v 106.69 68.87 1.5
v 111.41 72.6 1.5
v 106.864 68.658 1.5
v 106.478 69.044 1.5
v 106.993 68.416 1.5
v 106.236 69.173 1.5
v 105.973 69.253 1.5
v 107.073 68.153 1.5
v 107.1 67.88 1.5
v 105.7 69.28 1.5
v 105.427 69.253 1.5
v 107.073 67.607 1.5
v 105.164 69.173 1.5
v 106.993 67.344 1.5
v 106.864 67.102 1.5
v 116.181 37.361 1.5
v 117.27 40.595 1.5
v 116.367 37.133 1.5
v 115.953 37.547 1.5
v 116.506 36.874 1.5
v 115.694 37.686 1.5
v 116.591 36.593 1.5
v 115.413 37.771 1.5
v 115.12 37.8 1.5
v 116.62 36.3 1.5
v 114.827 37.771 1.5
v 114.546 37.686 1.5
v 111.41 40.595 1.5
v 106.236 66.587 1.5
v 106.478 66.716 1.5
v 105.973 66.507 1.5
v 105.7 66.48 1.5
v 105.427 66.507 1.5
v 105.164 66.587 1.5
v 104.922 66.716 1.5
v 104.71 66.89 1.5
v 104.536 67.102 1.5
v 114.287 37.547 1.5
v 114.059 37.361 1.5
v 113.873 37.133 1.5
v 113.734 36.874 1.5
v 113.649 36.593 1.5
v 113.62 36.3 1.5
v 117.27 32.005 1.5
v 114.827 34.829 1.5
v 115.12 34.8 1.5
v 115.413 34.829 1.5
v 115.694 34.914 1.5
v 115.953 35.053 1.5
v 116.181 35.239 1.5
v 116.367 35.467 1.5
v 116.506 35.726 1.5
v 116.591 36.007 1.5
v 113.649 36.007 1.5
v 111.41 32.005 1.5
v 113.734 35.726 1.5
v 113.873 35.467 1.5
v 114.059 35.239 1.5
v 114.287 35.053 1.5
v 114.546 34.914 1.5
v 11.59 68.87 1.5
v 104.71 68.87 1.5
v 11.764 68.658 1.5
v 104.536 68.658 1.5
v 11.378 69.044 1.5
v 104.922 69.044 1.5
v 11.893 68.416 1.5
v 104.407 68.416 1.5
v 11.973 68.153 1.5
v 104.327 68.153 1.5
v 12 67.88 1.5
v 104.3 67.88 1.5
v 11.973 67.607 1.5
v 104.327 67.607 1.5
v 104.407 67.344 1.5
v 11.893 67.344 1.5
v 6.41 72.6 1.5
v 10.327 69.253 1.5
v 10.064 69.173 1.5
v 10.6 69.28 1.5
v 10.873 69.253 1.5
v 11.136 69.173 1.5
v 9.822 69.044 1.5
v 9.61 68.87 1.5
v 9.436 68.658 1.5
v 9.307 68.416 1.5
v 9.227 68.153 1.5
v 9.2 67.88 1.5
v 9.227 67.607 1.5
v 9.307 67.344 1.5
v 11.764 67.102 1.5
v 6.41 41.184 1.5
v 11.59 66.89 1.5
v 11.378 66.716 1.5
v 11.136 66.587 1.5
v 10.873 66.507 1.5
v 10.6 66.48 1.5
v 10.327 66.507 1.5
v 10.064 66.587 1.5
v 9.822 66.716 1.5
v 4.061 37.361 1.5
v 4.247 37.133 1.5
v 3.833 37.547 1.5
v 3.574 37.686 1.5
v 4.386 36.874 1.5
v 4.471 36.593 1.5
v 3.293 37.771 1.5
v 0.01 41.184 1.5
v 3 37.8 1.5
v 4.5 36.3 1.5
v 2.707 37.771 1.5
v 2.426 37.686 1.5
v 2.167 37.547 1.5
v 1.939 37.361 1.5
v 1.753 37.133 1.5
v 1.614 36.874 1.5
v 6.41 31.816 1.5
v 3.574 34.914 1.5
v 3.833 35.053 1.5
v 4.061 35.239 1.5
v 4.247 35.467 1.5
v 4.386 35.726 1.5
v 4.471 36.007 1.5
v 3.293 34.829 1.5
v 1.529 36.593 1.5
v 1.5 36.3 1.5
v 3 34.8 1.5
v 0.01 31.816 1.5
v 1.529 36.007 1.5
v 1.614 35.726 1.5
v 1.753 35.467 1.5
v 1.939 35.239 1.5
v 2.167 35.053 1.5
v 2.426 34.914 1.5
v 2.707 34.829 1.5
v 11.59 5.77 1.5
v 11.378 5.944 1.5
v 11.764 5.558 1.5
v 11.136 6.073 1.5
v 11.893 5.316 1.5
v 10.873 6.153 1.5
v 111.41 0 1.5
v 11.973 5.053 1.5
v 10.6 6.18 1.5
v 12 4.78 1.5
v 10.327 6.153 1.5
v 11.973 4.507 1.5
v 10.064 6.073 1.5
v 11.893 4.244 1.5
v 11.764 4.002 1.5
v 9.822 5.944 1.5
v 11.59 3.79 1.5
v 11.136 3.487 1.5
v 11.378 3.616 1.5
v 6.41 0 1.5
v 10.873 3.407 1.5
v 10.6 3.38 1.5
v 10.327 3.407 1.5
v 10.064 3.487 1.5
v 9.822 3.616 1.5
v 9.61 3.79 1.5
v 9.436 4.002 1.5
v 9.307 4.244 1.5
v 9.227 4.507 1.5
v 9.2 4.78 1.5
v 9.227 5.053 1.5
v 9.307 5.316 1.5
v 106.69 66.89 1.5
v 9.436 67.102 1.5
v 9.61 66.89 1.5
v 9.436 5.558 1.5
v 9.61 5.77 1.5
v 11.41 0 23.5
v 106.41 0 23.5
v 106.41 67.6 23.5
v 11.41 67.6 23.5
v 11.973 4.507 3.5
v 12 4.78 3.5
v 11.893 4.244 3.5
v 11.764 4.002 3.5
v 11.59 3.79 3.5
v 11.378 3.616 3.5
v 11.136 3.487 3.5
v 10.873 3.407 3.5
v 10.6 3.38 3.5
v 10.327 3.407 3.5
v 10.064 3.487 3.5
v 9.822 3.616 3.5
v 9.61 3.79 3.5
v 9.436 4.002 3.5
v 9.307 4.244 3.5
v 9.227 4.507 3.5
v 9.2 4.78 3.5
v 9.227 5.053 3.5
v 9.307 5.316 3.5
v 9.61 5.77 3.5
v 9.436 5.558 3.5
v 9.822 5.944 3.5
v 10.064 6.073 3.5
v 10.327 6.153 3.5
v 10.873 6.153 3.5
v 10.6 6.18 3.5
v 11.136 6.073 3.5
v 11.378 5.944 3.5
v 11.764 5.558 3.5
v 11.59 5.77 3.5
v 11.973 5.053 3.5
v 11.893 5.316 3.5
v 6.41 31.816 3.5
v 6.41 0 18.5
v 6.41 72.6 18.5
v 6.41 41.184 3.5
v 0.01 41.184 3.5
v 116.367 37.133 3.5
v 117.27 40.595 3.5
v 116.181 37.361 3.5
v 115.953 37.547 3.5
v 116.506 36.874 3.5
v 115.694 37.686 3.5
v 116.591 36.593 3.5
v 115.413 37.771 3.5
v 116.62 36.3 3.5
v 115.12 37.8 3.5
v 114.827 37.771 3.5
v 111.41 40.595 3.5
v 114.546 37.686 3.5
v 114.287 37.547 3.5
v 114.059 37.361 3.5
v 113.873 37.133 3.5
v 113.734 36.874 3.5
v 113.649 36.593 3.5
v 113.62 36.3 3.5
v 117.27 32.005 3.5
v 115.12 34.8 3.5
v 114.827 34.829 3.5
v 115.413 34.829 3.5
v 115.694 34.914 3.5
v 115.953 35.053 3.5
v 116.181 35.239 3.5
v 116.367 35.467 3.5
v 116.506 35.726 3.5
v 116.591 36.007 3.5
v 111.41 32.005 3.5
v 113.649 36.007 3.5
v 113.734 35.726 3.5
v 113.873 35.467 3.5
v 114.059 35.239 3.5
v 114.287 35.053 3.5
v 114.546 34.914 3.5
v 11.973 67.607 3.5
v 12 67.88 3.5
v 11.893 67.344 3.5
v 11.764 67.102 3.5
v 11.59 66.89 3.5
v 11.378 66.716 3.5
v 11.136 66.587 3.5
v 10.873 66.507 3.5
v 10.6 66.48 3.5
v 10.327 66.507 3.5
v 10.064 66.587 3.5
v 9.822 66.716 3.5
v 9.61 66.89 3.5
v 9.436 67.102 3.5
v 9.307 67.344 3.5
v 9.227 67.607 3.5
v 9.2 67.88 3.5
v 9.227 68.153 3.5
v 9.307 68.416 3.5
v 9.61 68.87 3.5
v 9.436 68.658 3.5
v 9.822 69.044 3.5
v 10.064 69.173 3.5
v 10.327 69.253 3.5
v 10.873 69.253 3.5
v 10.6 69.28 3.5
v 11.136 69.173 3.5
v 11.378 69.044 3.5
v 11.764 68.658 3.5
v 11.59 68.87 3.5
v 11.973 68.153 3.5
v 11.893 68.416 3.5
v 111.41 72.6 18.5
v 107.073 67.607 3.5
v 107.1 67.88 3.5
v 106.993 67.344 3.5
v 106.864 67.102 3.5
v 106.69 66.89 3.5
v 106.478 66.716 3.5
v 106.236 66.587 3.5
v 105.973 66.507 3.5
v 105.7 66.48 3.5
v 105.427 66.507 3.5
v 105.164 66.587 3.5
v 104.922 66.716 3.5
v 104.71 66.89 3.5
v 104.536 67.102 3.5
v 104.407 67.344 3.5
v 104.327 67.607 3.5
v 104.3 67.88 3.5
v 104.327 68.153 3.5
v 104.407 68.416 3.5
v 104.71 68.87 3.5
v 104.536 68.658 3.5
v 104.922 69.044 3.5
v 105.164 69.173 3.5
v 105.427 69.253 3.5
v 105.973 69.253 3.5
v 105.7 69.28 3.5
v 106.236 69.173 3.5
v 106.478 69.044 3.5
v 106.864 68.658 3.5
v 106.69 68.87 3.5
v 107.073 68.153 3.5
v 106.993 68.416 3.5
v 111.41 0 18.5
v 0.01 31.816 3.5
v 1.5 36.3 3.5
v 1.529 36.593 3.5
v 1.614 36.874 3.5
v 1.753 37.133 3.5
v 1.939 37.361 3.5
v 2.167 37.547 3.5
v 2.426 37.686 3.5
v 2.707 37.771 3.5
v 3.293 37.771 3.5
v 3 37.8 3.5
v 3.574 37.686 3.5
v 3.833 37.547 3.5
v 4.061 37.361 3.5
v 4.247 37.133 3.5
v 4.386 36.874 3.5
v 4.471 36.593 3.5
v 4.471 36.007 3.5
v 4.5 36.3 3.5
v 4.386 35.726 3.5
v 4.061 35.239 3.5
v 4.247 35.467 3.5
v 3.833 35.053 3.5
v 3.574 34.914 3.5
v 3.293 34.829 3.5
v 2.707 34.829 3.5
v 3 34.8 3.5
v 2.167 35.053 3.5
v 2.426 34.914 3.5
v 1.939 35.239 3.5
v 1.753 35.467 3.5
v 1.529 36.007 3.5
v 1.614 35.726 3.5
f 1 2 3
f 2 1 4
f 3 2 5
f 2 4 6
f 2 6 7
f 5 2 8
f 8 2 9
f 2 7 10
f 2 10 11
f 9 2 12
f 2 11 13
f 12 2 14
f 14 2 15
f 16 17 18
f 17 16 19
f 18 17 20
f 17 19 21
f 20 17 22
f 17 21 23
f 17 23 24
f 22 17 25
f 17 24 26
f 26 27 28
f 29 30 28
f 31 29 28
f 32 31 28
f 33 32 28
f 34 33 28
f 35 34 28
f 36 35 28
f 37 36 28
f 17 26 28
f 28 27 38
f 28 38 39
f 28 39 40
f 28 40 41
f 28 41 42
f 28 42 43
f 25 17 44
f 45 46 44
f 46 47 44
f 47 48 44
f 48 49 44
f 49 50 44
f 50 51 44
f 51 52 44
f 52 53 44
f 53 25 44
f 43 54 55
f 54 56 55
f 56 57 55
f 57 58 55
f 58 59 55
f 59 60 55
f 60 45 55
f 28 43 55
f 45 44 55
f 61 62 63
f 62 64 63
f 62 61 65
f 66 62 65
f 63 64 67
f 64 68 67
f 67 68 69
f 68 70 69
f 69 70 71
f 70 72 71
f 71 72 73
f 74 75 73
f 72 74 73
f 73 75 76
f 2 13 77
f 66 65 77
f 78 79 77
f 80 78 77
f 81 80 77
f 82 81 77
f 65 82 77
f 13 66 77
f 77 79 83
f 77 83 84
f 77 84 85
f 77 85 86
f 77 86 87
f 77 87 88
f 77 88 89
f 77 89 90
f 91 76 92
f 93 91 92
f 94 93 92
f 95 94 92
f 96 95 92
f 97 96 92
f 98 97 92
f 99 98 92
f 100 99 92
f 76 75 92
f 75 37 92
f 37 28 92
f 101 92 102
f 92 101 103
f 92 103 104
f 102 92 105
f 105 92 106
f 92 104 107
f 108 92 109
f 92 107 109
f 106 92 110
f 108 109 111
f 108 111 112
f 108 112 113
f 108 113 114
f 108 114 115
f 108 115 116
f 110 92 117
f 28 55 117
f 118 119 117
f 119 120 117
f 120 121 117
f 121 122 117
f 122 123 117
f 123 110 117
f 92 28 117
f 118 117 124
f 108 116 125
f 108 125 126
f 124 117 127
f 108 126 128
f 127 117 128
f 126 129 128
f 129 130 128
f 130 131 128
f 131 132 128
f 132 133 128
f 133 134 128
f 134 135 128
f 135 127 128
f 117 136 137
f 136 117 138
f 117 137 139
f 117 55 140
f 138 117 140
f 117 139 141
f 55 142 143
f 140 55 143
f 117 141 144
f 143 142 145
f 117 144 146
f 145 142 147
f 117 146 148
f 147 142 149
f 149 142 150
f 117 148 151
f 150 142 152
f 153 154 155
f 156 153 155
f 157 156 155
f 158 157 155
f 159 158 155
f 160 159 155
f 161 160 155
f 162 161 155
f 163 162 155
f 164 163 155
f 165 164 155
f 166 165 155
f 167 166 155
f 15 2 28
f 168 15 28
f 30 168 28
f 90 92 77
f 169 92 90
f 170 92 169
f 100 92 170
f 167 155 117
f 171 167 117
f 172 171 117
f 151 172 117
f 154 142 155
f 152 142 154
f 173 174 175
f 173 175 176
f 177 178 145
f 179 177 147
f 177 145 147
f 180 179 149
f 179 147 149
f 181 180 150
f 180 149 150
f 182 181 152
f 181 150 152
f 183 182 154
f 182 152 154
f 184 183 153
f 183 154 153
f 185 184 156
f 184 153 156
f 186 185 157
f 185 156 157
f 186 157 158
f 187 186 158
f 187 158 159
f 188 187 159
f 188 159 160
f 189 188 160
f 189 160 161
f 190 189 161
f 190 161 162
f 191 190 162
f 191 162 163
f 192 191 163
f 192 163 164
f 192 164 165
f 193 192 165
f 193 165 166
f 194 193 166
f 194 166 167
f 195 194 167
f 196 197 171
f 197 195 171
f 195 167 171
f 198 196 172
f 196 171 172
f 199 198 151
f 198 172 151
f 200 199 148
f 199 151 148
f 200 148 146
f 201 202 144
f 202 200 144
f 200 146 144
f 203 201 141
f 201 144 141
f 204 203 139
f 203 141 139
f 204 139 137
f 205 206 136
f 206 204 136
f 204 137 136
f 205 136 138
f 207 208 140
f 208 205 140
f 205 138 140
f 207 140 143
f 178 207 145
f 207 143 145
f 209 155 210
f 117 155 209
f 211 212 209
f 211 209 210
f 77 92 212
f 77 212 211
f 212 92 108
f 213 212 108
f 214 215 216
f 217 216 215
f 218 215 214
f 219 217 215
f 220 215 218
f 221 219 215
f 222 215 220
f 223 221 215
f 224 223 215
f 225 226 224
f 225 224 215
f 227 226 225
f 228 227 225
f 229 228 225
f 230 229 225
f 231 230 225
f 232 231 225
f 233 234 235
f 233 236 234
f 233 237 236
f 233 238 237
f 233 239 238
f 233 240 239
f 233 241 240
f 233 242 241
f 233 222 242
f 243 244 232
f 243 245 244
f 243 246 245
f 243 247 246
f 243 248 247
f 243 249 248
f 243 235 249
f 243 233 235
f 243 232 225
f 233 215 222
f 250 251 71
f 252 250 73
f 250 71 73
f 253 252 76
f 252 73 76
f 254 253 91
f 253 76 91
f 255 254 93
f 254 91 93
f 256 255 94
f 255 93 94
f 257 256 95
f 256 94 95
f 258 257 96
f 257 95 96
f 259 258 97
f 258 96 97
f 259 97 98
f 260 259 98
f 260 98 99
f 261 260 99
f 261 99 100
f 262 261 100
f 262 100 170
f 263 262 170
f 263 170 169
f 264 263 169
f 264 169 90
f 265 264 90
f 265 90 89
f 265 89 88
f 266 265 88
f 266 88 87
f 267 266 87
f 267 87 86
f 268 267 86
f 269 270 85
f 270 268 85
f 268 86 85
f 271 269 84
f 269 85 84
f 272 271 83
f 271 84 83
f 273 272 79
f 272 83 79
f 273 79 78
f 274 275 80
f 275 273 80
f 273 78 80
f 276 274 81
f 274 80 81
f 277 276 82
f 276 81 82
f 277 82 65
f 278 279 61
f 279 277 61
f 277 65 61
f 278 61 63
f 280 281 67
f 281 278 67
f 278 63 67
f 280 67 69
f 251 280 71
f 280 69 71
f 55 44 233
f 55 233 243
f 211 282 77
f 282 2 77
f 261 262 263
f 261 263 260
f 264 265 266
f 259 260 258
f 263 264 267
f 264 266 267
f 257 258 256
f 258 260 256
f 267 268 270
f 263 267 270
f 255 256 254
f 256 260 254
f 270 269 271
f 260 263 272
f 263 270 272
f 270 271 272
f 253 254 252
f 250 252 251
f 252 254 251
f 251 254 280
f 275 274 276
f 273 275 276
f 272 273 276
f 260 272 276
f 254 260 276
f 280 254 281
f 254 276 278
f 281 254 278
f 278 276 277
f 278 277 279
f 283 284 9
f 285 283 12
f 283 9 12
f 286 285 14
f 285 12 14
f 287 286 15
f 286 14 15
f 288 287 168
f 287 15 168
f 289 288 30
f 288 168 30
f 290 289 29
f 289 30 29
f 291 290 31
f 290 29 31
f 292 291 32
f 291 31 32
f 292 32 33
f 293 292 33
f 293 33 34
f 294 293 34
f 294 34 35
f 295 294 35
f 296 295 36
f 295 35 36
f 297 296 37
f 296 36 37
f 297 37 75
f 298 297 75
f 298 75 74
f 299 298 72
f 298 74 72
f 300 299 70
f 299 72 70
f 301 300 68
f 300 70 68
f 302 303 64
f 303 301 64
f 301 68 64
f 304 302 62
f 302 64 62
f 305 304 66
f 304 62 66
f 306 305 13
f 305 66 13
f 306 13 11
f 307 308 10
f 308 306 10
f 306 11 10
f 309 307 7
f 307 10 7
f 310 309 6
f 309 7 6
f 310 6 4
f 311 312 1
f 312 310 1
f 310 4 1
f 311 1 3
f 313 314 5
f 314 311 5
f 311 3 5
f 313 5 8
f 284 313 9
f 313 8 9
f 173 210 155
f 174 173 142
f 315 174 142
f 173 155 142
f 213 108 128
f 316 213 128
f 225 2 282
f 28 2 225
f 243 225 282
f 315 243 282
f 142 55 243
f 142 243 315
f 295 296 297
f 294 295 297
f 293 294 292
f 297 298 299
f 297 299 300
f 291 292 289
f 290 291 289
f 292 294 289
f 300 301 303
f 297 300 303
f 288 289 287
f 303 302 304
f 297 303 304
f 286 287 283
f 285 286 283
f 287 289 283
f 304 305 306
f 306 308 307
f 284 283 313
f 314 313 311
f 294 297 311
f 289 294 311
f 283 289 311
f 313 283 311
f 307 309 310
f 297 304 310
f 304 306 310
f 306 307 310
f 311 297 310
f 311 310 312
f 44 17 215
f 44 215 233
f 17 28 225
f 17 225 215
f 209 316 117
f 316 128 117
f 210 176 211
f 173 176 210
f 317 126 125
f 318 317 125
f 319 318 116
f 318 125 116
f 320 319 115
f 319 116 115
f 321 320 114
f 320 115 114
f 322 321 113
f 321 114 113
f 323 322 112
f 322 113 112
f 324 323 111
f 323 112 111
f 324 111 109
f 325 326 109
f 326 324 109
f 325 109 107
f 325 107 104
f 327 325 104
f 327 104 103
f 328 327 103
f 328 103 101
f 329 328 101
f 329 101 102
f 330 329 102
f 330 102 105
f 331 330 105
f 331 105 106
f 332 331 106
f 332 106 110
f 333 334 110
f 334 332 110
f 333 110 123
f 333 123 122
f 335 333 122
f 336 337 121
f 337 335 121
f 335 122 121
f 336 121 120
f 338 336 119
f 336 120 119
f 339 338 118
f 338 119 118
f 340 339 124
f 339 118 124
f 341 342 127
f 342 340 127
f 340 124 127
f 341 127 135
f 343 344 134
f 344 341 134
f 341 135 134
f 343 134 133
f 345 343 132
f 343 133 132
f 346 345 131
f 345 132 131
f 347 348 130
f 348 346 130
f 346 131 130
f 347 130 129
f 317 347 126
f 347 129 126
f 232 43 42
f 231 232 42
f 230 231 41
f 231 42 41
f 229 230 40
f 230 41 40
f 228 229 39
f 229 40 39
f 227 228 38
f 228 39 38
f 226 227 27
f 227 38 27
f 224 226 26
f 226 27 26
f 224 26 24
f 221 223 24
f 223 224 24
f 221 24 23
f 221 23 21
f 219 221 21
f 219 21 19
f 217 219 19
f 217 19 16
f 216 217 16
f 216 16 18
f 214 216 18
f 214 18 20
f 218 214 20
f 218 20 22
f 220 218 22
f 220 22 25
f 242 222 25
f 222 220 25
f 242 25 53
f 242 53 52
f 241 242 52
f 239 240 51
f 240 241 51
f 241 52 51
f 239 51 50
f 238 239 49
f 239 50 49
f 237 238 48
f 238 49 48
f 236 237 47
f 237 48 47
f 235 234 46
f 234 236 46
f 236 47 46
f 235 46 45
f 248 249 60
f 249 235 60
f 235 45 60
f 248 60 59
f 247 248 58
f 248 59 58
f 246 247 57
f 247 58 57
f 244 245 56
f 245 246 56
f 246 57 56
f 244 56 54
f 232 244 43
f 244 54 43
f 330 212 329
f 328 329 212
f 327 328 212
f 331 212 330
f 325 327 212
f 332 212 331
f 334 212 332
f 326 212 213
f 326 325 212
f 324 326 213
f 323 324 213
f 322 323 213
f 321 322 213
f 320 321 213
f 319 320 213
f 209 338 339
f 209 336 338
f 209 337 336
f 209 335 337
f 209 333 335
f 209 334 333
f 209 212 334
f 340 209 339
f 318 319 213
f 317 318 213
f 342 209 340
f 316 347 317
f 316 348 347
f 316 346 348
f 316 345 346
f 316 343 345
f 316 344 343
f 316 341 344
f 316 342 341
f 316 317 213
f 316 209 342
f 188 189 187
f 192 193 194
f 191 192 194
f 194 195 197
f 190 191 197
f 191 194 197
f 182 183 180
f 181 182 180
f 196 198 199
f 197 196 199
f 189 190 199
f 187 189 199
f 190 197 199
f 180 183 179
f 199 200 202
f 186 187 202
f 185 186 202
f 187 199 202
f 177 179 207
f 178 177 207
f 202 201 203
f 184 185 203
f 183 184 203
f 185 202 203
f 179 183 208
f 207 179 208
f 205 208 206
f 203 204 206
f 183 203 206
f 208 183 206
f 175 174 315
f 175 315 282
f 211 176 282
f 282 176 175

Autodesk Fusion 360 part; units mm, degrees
sketch "Sketch1" plane through (0, 0, 0) normal (0, 0, 1) x (1, 0, 0)
  line L0 (0, 0) -> (117.82, 0)
  line L1 (117.82, 0) -> (117.82, 72.6)
  line L2 (117.82, 72.6) -> (0, 72.6)
  line L3 (0, 72.6) -> (0, 0)
  circle A0 centre (10.6, 67.88) radius 1.4
  circle A1 centre (10.6, 4.78) radius 1.4
  circle A2 centre (105.7, 67.88) radius 1.4
  line L4 (10.6, 67.88) -> (10.6, 69.28) construction
  line L5 (105.7, 67.88) -> (105.7, 69.28) construction
  line L6 (10.6, 67.88) -> (9.2, 67.88) construction
  line L7 (105.7, 67.88) -> (107.1, 67.88) construction
  line L8 (10.6, 4.78) -> (10.6, 3.38) construction
  line L9 (10.6, 4.78) -> (9.2, 4.78) construction
  line L10 (10.6, 67.88) -> (105.7, 67.88) construction
  line L11 (10.6, 67.88) -> (10.6, 4.78) construction
  line L12 (0, 36.3) -> (117.82, 36.3) construction
  circle A3 centre (3, 36.3) radius 1.5
  circle A4 centre (115.12, 36.3) radius 1.5
  dimension "d1" = 117.82
  dimension "d2" = 72.6
  dimension "d3" = 2.8
  dimension "d4" = 2.8
  dimension "d6" = 2.8
  dimension "d18" = 95.1
  dimension "d19" = 63.1
  dimension "d20" = 4.72
  dimension "d21" = 10.6
  dimension "d22" = 3
  dimension "d23" = 3
  dimension "d24" = 2.7
  dimension "d25" = 3
sketch "Sketch2" plane through (0, 0, 0) normal (0, 0, -1) x (1, 0, 0)
  circle A0 centre (10.6, -67.88) radius 1.4
  circle A1 centre (105.7, -67.88) radius 1.4
  circle A2 centre (10.6, -4.78) radius 1.4
  line L0 (0, 0) -> (0, -72.6)
  line L1 (0, -72.6) -> (117.82, -72.6)
  line L2 (117.82, -72.6) -> (117.82, 0)
  line L3 (117.82, 0) -> (0, 0)
  line L4 (117.82, -72.6) -> (0, 0) construction
  line L5 (0, -72.6) -> (117.82, 0) construction
  line L6 (88.1333, -48) -> (51.3806, -48)
  line L7 (51.3806, -48) -> (51.3806, -6)
  line L8 (51.3806, -6) -> (88.1333, -6)
  line L9 (88.1333, -6) -> (88.1333, -48)
  circle A3 centre (3, -36.3) radius 1.5
  circle A4 centre (115.12, -36.3) radius 1.5
sketch "Sketch3" plane through (0, 0, 1.5) normal (0, 0, 1) x (-1, 0, 0)
  circle A0 centre (-10.6, -67.88) radius 1.4
  circle A1 centre (-105.7, -67.88) radius 1.4
  circle A2 centre (-10.6, -4.78) radius 1.4
  circle A3 centre (-3, -36.3) radius 1.5
  circle A4 centre (-115.12, -36.3) radius 1.5
  line L0 (0, -72.6) -> (0, 0)
  line L1 (0, 0) -> (-117.82, 0)
  line L2 (-117.82, 0) -> (-117.82, -72.6)
  line L3 (-117.82, -72.6) -> (0, -72.6)
  line L4 (-6.41, -73) -> (-111.41, -73)
  line L5 (-111.41, -73) -> (-111.41, 0)
  line L6 (-111.41, 0) -> (-6.41, 0)
  line L7 (-6.41, 0) -> (-6.41, -73)
  line L8 (-6.41, -41.1844) -> (-0.01, -41.1844)
  line L9 (-0.01, -41.1844) -> (-0.01, -31.8156)
  line L10 (-0.01, -31.8156) -> (-6.41, -31.8156)
  line L11 (-111.41, -40.5951) -> (-117.27, -40.5951)
  line L12 (-117.27, -40.5951) -> (-117.27, -32.0049)
  line L13 (-117.27, -32.0049) -> (-111.41, -32.0049)
  line L14 (-117.27, -36.3) -> (-111.41, -36.3) construction
  line L15 (-0.01, -36.5) -> (-6.41, -36.5) construction
  line L16 (-58.91, 0) -> (-58.91, -72.6) construction
  point P0 (-115.12, -36.3)
  point P1 (-3, -36.5)
  dimension "d26" = 105
  dimension "d27" = 73
  dimension "d30" = 6.4
  dimension "d31" = 117.26
extrude "Extrude3" add sketch "Sketch3" along normal blind 22 contours A0 | A1 | A2 | L1 L3 L5 L6 L7
extrude "Extrude4" add sketch "Sketch3" along normal blind 2 contours L7 L8 L9 L10 | L5 L11 L12 L13
chamfer "Chamfer1" distance 5 angle 45 3 edges at (6.41, 36.3, 23.5) (58.91, 72.6, 23.5) (111.41, 36.3, 23.5)
shell "Shell1" thickness 2 removed faces 1 at (43.0767, 0, 8.8333)
extrude "Extrude5" cut sketch "Sketch1" along normal blind 3.5 contours A0 | A1 | A2
equation "d4 = d3"
equation "d6 = d3"
equation "d18 = 92.3 mm + d3"
equation "d19 = 60.3 mm + d3"
